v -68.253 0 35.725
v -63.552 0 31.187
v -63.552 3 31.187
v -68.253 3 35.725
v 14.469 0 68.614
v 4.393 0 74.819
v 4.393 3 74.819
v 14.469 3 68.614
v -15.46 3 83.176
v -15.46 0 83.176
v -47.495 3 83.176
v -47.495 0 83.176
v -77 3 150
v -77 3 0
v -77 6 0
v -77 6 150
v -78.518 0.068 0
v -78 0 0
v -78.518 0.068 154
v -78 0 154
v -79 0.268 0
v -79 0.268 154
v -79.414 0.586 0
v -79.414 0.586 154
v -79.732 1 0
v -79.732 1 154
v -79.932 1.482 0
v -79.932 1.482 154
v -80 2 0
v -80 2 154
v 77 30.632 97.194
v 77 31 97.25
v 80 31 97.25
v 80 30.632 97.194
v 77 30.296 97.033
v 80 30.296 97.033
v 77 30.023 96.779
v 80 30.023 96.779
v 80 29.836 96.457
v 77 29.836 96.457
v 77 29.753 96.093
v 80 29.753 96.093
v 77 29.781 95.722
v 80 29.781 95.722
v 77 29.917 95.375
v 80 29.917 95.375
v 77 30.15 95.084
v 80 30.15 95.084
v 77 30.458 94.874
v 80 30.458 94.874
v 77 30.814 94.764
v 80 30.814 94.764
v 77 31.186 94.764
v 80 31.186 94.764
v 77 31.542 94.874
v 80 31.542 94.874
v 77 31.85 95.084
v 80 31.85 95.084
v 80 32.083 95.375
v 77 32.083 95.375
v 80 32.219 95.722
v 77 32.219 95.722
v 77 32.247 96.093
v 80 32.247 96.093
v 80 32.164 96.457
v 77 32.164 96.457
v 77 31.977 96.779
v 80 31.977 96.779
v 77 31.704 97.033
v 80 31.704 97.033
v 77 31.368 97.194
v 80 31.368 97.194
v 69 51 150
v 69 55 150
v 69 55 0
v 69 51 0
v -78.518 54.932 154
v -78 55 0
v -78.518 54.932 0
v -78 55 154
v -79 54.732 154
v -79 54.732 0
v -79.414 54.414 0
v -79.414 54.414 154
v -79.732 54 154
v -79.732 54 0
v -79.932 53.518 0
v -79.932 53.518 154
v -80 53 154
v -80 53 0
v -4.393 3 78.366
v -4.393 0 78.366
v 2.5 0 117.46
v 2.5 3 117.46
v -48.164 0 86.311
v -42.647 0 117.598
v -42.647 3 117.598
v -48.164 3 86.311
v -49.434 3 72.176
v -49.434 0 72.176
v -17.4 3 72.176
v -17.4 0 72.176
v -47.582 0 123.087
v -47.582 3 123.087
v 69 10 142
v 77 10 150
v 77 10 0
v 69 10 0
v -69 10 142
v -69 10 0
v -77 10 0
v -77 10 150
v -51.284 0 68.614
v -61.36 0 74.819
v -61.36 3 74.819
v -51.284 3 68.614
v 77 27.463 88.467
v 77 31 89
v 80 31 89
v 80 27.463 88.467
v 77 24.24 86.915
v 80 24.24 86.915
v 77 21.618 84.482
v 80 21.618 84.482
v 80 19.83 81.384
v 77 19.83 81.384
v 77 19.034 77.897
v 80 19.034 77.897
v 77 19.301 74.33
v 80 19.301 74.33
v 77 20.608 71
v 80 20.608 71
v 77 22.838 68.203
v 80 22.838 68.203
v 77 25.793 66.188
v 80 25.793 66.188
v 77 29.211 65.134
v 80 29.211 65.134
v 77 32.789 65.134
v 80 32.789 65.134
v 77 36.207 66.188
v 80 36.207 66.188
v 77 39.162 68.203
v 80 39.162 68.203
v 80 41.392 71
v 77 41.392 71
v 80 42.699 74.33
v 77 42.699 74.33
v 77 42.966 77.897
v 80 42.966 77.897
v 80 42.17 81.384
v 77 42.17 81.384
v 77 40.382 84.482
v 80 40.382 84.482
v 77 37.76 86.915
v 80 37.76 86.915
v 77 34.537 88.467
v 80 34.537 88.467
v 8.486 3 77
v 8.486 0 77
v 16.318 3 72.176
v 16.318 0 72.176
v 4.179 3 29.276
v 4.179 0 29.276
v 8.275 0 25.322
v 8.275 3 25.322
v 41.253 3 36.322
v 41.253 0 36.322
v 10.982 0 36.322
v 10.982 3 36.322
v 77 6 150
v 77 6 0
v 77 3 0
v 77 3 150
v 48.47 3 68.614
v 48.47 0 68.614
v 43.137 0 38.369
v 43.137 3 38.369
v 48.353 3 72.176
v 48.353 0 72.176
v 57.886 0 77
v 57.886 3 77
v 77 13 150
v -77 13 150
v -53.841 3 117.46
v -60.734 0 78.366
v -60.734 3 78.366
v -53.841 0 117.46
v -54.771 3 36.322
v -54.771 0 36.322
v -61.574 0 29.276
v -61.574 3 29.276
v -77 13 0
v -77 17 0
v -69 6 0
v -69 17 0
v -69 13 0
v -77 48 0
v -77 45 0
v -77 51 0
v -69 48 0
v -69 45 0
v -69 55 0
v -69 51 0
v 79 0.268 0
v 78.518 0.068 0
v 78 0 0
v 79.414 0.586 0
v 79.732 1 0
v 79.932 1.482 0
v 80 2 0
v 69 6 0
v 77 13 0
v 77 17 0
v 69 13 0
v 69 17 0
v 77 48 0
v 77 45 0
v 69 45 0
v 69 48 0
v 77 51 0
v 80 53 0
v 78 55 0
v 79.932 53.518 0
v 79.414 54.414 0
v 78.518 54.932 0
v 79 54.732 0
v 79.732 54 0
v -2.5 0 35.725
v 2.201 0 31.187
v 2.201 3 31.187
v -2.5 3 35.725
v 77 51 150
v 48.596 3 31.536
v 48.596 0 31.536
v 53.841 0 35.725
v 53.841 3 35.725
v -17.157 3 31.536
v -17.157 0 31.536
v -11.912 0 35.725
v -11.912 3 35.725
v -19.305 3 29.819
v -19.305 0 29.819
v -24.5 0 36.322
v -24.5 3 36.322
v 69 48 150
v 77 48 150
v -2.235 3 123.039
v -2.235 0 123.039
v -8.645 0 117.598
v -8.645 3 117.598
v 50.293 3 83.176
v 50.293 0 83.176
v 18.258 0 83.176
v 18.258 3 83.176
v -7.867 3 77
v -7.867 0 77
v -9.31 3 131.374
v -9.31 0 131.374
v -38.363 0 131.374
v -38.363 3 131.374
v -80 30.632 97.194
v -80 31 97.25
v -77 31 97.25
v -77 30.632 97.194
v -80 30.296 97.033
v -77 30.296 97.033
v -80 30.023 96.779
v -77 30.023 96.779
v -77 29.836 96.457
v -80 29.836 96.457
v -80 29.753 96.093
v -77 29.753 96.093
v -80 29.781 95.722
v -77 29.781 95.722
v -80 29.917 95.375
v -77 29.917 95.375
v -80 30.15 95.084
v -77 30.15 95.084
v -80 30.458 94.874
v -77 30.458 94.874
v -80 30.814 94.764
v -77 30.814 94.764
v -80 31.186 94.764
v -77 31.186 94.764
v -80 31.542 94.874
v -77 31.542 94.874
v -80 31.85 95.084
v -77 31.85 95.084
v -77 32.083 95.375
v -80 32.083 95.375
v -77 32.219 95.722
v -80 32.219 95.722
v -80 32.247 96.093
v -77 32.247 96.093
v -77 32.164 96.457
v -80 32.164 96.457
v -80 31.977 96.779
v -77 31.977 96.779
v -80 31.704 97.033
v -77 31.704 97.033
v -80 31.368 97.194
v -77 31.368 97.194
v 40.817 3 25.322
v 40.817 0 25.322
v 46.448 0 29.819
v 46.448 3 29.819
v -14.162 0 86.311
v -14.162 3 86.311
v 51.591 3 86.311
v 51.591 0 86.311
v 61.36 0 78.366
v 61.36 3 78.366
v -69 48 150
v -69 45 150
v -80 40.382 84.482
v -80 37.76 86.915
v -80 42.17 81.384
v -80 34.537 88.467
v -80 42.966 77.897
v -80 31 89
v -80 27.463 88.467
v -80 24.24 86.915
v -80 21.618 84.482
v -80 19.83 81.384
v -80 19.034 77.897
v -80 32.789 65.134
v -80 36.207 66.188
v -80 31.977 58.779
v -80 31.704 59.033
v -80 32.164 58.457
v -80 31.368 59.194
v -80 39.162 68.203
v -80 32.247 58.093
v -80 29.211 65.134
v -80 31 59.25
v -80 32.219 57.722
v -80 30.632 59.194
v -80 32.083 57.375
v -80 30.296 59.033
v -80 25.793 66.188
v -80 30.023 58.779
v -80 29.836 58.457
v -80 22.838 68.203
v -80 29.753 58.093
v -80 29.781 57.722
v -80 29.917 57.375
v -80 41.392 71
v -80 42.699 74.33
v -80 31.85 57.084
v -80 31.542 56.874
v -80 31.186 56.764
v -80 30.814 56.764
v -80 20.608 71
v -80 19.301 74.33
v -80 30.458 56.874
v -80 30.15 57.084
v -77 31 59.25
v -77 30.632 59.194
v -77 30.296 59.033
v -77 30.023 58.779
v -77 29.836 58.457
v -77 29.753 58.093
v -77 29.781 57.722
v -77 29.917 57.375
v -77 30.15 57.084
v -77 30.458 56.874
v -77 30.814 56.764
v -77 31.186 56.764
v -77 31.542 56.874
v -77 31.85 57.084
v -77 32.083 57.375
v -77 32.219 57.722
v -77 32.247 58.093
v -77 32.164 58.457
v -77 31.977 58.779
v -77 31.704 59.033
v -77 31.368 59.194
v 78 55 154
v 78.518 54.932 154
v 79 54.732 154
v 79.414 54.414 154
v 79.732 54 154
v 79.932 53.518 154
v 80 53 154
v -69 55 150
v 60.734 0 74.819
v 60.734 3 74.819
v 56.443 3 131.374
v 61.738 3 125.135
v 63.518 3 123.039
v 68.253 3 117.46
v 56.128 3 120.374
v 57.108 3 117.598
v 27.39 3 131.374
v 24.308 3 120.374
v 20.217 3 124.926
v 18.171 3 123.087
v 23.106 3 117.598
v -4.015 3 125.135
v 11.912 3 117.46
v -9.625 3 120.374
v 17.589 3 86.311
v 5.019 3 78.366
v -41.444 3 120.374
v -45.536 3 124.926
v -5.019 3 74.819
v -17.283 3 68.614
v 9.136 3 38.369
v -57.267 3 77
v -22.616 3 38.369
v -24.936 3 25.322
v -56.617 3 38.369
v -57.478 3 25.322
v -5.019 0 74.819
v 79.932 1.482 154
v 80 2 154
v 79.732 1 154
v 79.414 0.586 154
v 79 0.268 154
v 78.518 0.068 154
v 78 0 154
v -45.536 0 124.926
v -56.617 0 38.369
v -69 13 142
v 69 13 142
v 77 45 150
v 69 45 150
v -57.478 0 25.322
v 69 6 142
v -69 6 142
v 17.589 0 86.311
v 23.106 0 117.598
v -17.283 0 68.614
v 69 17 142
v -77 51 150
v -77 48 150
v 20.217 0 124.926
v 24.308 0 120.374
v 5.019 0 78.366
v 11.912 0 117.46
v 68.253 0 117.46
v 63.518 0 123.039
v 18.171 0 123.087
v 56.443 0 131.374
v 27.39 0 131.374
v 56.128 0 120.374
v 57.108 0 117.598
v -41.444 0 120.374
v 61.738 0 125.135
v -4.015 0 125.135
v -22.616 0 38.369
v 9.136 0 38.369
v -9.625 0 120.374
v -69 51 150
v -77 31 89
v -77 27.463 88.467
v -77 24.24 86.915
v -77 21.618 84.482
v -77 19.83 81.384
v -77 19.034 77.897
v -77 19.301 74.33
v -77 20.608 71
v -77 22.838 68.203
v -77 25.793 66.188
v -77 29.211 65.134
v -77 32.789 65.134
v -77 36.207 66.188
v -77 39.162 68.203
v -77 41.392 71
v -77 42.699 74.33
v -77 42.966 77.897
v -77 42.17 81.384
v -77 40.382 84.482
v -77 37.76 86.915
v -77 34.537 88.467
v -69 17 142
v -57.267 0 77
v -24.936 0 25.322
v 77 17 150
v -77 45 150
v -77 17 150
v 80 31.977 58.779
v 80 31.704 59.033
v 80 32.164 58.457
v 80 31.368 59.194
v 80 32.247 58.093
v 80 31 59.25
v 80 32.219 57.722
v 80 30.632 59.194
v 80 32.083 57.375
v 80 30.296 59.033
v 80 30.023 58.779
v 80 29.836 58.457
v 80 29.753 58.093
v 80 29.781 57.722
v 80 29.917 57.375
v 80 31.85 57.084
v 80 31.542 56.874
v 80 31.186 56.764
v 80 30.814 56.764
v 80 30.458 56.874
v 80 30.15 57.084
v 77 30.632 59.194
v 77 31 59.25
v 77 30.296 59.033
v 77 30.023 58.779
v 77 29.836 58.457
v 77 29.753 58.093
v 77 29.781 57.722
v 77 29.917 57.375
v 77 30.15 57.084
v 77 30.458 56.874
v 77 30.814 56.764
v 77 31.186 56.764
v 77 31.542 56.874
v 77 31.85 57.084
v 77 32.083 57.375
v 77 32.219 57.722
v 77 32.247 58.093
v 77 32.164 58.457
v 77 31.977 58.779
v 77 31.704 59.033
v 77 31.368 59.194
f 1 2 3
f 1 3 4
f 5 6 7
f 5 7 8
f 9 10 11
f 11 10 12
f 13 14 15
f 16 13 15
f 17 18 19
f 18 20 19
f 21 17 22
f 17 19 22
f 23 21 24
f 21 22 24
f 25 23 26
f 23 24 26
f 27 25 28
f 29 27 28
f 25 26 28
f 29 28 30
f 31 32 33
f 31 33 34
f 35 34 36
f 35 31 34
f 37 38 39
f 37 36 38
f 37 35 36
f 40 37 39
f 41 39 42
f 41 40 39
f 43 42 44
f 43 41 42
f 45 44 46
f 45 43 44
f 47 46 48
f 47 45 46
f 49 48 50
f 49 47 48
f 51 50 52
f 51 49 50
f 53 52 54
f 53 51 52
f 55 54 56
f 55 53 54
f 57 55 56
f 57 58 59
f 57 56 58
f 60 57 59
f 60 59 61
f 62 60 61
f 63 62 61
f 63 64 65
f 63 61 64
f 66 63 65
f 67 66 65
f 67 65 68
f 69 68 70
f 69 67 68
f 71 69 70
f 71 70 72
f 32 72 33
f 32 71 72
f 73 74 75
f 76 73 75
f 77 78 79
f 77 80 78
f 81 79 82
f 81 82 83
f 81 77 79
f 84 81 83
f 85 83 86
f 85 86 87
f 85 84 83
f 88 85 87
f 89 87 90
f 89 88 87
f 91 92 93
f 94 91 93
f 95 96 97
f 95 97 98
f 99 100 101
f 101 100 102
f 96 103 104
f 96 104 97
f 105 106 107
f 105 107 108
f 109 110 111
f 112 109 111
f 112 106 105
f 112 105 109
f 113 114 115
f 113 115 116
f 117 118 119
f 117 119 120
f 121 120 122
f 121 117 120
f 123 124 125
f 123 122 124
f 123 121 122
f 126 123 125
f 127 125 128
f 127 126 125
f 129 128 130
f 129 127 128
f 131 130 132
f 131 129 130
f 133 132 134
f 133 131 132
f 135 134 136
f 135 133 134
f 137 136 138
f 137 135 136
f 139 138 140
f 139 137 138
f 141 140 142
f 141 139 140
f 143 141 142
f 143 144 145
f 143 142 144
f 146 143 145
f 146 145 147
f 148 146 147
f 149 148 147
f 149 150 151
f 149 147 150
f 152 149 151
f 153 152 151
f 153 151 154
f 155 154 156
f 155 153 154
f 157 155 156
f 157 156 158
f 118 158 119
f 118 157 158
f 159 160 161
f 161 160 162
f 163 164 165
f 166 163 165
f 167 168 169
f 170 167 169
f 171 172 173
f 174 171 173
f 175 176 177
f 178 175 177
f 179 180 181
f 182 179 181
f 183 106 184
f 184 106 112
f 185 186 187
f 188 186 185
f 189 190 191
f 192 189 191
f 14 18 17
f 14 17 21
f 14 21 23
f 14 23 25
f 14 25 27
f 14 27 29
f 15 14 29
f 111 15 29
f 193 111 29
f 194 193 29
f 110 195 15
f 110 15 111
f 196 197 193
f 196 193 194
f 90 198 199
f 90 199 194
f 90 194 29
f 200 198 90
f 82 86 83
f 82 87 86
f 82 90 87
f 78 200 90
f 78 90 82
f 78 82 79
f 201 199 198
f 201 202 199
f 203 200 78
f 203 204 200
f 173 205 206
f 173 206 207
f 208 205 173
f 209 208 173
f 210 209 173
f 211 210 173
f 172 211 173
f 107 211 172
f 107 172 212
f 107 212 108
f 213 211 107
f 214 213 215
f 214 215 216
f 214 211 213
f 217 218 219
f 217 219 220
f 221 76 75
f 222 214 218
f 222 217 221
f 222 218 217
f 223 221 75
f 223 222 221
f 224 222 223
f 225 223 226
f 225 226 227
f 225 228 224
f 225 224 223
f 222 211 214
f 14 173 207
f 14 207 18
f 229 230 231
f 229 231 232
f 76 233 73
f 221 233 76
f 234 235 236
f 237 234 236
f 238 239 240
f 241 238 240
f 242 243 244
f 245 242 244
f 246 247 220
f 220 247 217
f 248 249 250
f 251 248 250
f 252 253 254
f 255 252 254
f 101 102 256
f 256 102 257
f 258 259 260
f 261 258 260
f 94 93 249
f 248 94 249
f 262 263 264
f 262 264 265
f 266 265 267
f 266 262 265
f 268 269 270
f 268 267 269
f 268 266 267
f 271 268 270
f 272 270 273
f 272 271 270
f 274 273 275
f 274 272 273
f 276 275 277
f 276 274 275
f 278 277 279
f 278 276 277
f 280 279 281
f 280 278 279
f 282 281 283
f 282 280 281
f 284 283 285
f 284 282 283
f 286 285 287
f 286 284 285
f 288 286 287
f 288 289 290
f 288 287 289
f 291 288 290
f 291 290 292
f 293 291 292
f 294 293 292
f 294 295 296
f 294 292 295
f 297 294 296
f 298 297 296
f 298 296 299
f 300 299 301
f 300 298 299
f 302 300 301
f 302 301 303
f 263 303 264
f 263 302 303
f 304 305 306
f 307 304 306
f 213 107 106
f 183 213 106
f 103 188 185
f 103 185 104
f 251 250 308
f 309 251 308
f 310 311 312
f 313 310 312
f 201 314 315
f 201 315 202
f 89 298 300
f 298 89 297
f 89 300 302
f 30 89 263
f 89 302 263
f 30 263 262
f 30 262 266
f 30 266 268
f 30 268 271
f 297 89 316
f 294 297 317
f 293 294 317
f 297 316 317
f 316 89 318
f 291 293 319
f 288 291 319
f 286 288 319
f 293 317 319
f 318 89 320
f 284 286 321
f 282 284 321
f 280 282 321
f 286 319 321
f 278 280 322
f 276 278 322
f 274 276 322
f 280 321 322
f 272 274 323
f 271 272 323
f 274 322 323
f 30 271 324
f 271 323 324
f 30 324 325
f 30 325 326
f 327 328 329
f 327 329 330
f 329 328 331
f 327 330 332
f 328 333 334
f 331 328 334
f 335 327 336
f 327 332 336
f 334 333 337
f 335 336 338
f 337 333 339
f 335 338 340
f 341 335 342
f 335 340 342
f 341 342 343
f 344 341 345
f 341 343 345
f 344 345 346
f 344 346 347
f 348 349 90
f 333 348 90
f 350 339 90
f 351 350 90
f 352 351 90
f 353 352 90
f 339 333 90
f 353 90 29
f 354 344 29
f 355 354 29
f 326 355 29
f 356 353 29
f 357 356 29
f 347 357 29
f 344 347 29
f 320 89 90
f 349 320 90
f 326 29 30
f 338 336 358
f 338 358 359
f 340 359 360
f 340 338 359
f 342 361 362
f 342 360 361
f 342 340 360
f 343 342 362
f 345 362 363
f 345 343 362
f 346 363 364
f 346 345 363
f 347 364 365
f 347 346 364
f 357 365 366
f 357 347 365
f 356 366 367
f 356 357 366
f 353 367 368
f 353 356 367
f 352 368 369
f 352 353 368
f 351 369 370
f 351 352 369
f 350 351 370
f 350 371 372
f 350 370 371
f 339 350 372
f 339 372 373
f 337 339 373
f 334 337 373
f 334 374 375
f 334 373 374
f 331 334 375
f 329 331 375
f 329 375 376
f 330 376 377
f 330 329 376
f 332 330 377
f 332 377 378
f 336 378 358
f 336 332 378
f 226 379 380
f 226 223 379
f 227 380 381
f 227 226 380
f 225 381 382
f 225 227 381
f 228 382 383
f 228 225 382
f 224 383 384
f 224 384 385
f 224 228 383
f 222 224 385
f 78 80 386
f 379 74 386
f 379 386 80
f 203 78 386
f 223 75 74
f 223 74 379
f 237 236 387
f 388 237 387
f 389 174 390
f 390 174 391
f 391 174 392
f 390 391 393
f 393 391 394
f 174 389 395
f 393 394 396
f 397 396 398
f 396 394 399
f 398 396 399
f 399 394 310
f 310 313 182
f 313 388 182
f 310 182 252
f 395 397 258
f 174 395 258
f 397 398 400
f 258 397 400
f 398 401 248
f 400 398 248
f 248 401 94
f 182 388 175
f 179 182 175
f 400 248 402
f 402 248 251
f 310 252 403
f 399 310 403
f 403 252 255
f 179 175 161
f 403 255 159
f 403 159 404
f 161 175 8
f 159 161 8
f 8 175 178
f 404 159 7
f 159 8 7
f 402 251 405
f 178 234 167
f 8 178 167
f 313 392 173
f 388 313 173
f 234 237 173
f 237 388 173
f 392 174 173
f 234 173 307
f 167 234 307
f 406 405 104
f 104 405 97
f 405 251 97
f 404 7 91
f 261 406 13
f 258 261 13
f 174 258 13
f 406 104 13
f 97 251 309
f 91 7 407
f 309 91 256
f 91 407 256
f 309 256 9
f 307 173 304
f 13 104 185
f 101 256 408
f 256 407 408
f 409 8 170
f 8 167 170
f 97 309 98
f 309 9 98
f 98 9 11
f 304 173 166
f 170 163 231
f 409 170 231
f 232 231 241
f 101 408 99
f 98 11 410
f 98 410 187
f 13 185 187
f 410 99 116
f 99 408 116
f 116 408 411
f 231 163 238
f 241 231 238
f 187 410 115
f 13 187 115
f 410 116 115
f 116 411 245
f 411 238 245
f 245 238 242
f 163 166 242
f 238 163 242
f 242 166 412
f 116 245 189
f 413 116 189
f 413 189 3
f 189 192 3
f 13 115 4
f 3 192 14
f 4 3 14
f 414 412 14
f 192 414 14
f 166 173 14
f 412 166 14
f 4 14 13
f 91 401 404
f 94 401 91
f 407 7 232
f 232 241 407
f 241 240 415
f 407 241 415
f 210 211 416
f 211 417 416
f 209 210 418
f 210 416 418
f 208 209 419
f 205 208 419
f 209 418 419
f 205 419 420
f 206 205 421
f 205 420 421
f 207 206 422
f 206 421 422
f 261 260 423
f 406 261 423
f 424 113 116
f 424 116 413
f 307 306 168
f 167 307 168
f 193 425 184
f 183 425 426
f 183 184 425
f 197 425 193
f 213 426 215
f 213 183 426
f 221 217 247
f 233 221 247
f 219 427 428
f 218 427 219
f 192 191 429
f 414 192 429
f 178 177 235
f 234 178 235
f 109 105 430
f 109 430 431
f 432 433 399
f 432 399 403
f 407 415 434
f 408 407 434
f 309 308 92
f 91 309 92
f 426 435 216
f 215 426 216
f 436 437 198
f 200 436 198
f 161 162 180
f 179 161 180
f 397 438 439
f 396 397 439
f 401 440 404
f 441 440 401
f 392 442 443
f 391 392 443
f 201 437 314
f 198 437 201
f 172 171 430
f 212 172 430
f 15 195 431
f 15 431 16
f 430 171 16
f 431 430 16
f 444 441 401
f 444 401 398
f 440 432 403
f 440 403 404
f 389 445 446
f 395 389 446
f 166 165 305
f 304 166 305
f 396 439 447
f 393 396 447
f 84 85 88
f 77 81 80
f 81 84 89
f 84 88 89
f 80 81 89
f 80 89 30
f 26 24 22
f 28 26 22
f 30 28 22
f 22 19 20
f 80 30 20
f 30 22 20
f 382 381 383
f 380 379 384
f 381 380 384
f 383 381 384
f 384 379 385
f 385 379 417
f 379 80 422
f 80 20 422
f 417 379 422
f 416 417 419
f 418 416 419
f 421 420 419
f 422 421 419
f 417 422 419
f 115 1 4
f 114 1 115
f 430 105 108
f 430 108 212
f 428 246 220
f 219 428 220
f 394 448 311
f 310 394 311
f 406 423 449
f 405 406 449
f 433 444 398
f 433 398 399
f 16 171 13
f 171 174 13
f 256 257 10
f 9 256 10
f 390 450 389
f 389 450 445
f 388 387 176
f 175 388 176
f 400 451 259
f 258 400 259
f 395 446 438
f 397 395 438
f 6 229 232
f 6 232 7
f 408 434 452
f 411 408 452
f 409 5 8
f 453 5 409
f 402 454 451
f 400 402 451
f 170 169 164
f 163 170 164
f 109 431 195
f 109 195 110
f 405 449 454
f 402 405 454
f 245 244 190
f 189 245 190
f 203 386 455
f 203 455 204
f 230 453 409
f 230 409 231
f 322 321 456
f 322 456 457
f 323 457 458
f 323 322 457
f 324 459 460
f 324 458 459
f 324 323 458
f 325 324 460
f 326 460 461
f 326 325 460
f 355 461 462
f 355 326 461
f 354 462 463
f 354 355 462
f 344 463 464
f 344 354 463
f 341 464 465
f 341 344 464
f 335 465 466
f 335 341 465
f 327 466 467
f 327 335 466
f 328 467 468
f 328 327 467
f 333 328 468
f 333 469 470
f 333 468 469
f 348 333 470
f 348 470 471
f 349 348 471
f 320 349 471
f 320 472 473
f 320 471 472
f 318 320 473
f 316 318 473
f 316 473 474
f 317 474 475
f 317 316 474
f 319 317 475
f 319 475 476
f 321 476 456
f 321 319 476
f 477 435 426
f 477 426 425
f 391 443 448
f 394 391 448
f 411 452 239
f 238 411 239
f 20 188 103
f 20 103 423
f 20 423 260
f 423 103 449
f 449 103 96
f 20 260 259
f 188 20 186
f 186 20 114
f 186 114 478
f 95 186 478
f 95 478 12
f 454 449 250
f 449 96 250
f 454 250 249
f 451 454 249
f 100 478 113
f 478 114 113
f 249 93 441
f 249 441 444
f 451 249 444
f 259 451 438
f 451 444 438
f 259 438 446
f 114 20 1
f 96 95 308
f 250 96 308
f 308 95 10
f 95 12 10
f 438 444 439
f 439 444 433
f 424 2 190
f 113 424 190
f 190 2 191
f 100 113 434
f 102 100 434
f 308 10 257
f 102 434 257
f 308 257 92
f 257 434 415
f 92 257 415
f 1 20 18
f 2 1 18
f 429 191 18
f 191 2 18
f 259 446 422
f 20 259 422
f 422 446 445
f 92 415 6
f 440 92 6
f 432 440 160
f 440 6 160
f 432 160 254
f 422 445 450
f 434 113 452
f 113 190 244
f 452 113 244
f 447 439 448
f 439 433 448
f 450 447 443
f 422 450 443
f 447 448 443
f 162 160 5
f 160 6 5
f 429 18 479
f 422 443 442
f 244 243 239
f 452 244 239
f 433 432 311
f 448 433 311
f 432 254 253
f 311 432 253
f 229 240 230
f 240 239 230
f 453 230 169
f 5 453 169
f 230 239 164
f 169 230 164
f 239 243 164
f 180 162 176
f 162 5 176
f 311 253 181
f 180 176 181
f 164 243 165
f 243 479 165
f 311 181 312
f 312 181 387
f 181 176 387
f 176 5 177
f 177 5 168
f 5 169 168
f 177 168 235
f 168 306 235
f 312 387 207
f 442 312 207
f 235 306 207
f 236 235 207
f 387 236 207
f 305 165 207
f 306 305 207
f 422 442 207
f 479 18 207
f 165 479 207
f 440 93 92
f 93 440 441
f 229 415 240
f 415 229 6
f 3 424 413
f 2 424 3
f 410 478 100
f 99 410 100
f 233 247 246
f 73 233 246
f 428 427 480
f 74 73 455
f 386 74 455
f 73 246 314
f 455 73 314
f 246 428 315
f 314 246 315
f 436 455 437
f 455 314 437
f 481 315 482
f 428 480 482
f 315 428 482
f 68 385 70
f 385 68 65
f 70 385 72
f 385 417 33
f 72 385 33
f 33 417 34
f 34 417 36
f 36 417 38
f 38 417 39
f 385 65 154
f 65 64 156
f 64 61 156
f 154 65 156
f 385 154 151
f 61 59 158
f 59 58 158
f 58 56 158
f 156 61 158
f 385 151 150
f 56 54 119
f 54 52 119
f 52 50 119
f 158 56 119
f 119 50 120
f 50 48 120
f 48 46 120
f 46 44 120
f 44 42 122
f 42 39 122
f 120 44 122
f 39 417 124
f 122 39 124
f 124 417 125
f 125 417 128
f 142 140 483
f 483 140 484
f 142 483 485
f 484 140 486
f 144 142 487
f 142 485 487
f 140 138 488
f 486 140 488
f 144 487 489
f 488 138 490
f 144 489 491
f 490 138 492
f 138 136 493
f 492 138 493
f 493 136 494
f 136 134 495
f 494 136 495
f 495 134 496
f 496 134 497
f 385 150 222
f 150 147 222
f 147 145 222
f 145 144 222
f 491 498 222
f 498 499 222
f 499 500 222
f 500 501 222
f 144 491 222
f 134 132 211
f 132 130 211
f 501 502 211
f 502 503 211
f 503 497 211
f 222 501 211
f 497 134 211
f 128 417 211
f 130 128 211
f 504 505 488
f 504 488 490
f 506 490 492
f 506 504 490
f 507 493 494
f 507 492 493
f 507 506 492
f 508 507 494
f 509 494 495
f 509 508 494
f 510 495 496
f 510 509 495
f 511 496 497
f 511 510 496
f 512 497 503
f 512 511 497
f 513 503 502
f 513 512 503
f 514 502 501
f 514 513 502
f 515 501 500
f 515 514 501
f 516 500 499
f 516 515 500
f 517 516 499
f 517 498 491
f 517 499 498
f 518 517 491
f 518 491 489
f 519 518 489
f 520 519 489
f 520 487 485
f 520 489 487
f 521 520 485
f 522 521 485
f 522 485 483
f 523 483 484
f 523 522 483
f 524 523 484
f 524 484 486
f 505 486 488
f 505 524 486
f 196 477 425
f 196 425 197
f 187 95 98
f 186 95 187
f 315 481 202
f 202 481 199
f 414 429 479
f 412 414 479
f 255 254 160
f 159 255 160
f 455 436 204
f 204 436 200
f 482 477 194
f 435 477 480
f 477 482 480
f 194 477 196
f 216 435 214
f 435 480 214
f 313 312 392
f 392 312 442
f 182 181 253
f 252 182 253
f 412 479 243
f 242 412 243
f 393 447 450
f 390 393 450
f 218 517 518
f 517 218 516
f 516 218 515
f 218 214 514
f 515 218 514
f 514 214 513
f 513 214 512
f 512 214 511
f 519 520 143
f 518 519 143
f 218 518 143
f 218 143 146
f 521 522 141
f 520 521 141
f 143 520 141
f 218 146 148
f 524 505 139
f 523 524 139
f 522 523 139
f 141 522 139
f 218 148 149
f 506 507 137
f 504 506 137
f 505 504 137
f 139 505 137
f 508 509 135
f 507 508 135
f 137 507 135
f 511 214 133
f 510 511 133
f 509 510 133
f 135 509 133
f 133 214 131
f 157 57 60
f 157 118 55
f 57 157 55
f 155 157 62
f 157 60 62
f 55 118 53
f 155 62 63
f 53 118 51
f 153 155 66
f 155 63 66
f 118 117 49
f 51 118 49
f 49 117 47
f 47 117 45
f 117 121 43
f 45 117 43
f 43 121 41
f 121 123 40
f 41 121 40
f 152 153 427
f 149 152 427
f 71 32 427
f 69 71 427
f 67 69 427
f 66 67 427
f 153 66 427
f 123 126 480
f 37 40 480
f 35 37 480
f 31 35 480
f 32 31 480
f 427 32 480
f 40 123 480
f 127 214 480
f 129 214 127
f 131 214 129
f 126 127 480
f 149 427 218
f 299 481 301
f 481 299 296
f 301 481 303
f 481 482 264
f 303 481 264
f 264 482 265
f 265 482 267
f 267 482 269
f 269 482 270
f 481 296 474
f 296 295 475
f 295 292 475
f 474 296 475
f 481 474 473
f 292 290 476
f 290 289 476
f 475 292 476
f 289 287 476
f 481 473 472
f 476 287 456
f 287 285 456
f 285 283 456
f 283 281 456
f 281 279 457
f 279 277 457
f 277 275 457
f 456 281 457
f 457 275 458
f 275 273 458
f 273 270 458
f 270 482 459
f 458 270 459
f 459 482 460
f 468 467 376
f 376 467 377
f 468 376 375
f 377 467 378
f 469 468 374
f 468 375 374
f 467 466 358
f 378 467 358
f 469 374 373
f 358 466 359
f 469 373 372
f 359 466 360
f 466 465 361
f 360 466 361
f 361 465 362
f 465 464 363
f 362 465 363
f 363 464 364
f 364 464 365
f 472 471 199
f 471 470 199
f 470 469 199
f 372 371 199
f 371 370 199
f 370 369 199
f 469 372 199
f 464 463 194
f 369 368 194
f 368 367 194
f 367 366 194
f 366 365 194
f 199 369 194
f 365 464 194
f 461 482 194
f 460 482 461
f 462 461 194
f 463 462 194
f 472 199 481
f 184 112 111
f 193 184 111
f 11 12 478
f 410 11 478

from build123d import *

# Parameters (mm, degrees)
BOSS_EXTRUDE4_DEPTH             = 154
BOSS_EXTRUDE5_REACH             = 216.516
SKETCH11_W                      = 4
SKETCH11_H                      = 7
BOSS_EXTRUDE5_DIRECTION_2_REACH = 216.516
BOSS_EXTRUDE6_DEPTH             = 45
SKETCH15_W                      = 138
SKETCH15_H                      = 4
SKETCH15_W_2                    = 154
BOSS_EXTRUDE7_DEPTH             = 8
SKETCH16_W                      = 150
SKETCH16_H                      = 3
SKETCH16_W_2                    = 142
SKETCH16_H_2                    = 4
BOSS_EXTRUDE8_DEPTH             = 8
CUT_EXTRUDE2_DEPTH              = 229.781555201
CUT_EXTRUDE2_DEPTH_BACK         = 229.781555201
SKETCH19_R                      = 12
SKETCH19_R_2                    = 1.25
CUT_EXTRUDE3_REACH              = 184.047
FILLET3_R                       = 2


with BuildPart() as part:
    # Sketch3 → Boss-Extrude4 (new body)
    with BuildSketch(Plane.XY):
        Polygon((-80, 0), (80, 0), (80, 10), (69, 10), (69, 6), (77, 6), (77, 3), (-77, 3), (-77, 6), (-69, 6), (-69, 10), (-80, 10), align=None)
    extrude(amount=BOSS_EXTRUDE4_DEPTH)

    # Sketch11 → Boss-Extrude5 (add, up to next)
    with BuildSketch(Plane(origin=(-69, 0, 0), x_dir=(0, 0, -1), z_dir=(1, 0, 0)), mode=Mode.PRIVATE) as boss_extrude5_sk1:
        with Locations((-152, 6.5)):
            Rectangle(SKETCH11_W, SKETCH11_H)
    boss_extrude5_tool1 = extrude(boss_extrude5_sk1.sketch, amount=BOSS_EXTRUDE5_REACH, mode=Mode.PRIVATE) - part.part
    add(boss_extrude5_tool1.solids().sort_by_distance((-69, 6.5, 152))[0])

    # Sketch11 → Boss-Extrude5 direction 2 (add, up to next)
    with BuildSketch(Plane(origin=(-69, 0, 0), x_dir=(0, 0, -1), z_dir=(1, 0, 0)), mode=Mode.PRIVATE) as boss_extrude5_direction_2_sk1:
        with Locations((-152, 6.5)):
            Rectangle(SKETCH11_W, SKETCH11_H)
    boss_extrude5_direction_2_tool1 = extrude(boss_extrude5_direction_2_sk1.sketch, amount=-BOSS_EXTRUDE5_DIRECTION_2_REACH, mode=Mode.PRIVATE) - part.part
    add(boss_extrude5_direction_2_tool1.solids().sort_by_distance((-69, 6.5, 152))[0])

    # Sketch13 → Boss-Extrude6 (add)
    with BuildSketch(Plane(origin=(0, 10, 0), x_dir=(1, 0, 0), z_dir=(0, 1, 0))):
        Polygon((80, 0), (77, 0), (77, -150), (-77, -150), (-77, 0), (-80, 0), (-80, -154), (80, -154), align=None)
    extrude(amount=BOSS_EXTRUDE6_DEPTH)

    # Sketch15 → Boss-Extrude7 (add)
    with BuildSketch(Plane(origin=(0, 0, 150), x_dir=(-1, 0, 0), z_dir=(0, 0, -1))):
        with Locations((0, 8)):
            Rectangle(SKETCH15_W, SKETCH15_H)
        with Locations((0, 15)):
            Rectangle(SKETCH15_W_2, SKETCH15_H)
    extrude(amount=BOSS_EXTRUDE7_DEPTH)

    # Sketch16 → Boss-Extrude8 (add)
    with BuildSketch(Plane(origin=(-77, 0, 0), x_dir=(0, 0, -1), z_dir=(1, 0, 0))):
        with Locations((-75, 46.5)):
            Rectangle(SKETCH16_W, SKETCH16_H)
        with Locations((-71, 15)):
            Rectangle(SKETCH16_W_2, SKETCH16_H_2)
        with Locations((-75, 53)):
            Rectangle(SKETCH16_W, SKETCH16_H_2)
    boss_extrude8 = extrude(amount=BOSS_EXTRUDE8_DEPTH)

    # Mirror1: Boss-Extrude8 across plane
    add(boss_extrude8.mirror(Plane(origin=(0, 0, 0), x_dir=(0, 0, 1), z_dir=(1, 0, 0))))

    # Sketch19 → Cut-Extrude2 (cut, two sides: drawn at the far end of the back side and taken through both)
    with BuildSketch(Plane(origin=(80, 0, 0), x_dir=(0, 0, -1), z_dir=(1, 0, 0)).offset(-CUT_EXTRUDE2_DEPTH_BACK)):
        with Locations(Location((-77, 31, 0), (0, 0, 180))):
            Circle(SKETCH19_R)
        with Locations(Location((-58, 31, 0), (0, 0, 180))):
            Circle(SKETCH19_R_2)
        with Locations(Location((-96, 31, 0), (0, 0, 180))):
            Circle(SKETCH19_R_2)
    extrude(amount=CUT_EXTRUDE2_DEPTH + CUT_EXTRUDE2_DEPTH_BACK, mode=Mode.SUBTRACT)

    # Sketch27 → Cut-Extrude3 (cut, up to next)
    with BuildSketch(Plane.XZ, mode=Mode.PRIVATE) as cut_extrude3_sk1:
        Polygon((-57.47846256, 25.321688373), (-24.93570827, 25.321688373), (-19.305381247, 29.819289123), (-24.499608086, 36.321688373), (-54.771412112, 36.321688373), (-61.574151377, 29.276341528), align=None)
    cut_extrude3_tool1 = extrude(cut_extrude3_sk1.sketch, amount=-CUT_EXTRUDE3_REACH, mode=Mode.PRIVATE) & part.part
    # Sketch27 → Cut-Extrude3 (cut, up to next)
    with BuildSketch(Plane.XZ, mode=Mode.PRIVATE) as cut_extrude3_sk2:
        Polygon((-56.617071459, 38.369250276), (-63.55245833, 31.186525183), (-68.252983819, 35.725187368), (-61.359608852, 74.819459497), (-51.28413594, 68.613830533), align=None)
    cut_extrude3_tool2 = extrude(cut_extrude3_sk2.sketch, amount=-CUT_EXTRUDE3_REACH, mode=Mode.PRIVATE) & part.part
    # Sketch27 → Cut-Extrude3 (cut, up to next)
    with BuildSketch(Plane.XZ, mode=Mode.PRIVATE) as cut_extrude3_sk3:
        Polygon((-22.615548373, 38.369250276), (-17.156752628, 31.535650116), (-11.912075272, 35.725187368), (-5.018700304, 74.819459497), (-17.282612854, 68.613830533), align=None)
    cut_extrude3_tool3 = extrude(cut_extrude3_sk3.sketch, amount=-CUT_EXTRUDE3_REACH, mode=Mode.PRIVATE) & part.part
    # Sketch27 → Cut-Extrude3 (cut, up to next)
    with BuildSketch(Plane.XZ, mode=Mode.PRIVATE) as cut_extrude3_sk4:
        Polygon((-57.266645874, 77), (-49.434486563, 72.176060211), (-17.400076182, 72.176060211), (-7.866735395, 77), (-15.460479394, 83.176060211), (-47.494889775, 83.176060211), align=None)
    cut_extrude3_tool4 = extrude(cut_extrude3_sk4.sketch, amount=-CUT_EXTRUDE3_REACH, mode=Mode.PRIVATE) & part.part
    # Sketch27 → Cut-Extrude3 (cut, up to next)
    with BuildSketch(Plane.XZ, mode=Mode.PRIVATE) as cut_extrude3_sk5:
        Polygon((-60.734283515, 78.365855711), (-53.840908548, 117.46012784), (-47.581510302, 123.087083774), (-42.646926869, 117.59787731), (-48.163667933, 86.310884009), align=None)
    cut_extrude3_tool5 = extrude(cut_extrude3_sk5.sketch, amount=-CUT_EXTRUDE3_REACH, mode=Mode.PRIVATE) & part.part
    # Sketch27 → Cut-Extrude3 (cut, up to next)
    with BuildSketch(Plane.XZ, mode=Mode.PRIVATE) as cut_extrude3_sk6:
        Polygon((-14.162144847, 86.310884009), (-4.393374967, 78.365855711), (2.5, 117.46012784), (-2.235185266, 123.038840685), (-8.645403783, 117.59787731), align=None)
    cut_extrude3_tool6 = extrude(cut_extrude3_sk6.sketch, amount=-CUT_EXTRUDE3_REACH, mode=Mode.PRIVATE) & part.part
    # Sketch27 → Cut-Extrude3 (cut, up to next)
    with BuildSketch(Plane.XZ, mode=Mode.PRIVATE) as cut_extrude3_sk7:
        Polygon((-45.536395336, 124.925562704), (-41.444496972, 120.373754987), (-9.624660978, 120.373754987), (-4.014751663, 125.13541967), (-9.309821385, 131.373754987), (-38.363457794, 131.373754987), align=None)
    cut_extrude3_tool7 = extrude(cut_extrude3_sk7.sketch, amount=-CUT_EXTRUDE3_REACH, mode=Mode.PRIVATE) & part.part
    # Sketch27 → Cut-Extrude3 (cut, up to next)
    with BuildSketch(Plane.XZ, mode=Mode.PRIVATE) as cut_extrude3_sk8:
        Polygon((8.274521259, 25.321688373), (40.817275549, 25.321688373), (46.447602573, 29.819289123), (41.253375733, 36.321688373), (10.981571707, 36.321688373), (4.178832443, 29.276341528), align=None)
    cut_extrude3_tool8 = extrude(cut_extrude3_sk8.sketch, amount=-CUT_EXTRUDE3_REACH, mode=Mode.PRIVATE) & part.part
    # Sketch27 → Cut-Extrude3 (cut, up to next)
    with BuildSketch(Plane.XZ, mode=Mode.PRIVATE) as cut_extrude3_sk9:
        Polygon((9.13591236, 38.369250276), (2.200525489, 31.186525183), (-2.5, 35.725187368), (4.393374967, 74.819459497), (14.46884788, 68.613830533), align=None)
    cut_extrude3_tool9 = extrude(cut_extrude3_sk9.sketch, amount=-CUT_EXTRUDE3_REACH, mode=Mode.PRIVATE) & part.part
    # Sketch27 → Cut-Extrude3 (cut, up to next)
    with BuildSketch(Plane.XZ, mode=Mode.PRIVATE) as cut_extrude3_sk10:
        Polygon((43.137435446, 38.369250276), (48.596231191, 31.535650116), (53.840908548, 35.725187368), (60.734283515, 74.819459497), (48.470370966, 68.613830533), align=None)
    cut_extrude3_tool10 = extrude(cut_extrude3_sk10.sketch, amount=-CUT_EXTRUDE3_REACH, mode=Mode.PRIVATE) & part.part
    # Sketch27 → Cut-Extrude3 (cut, up to next)
    with BuildSketch(Plane.XZ, mode=Mode.PRIVATE) as cut_extrude3_sk11:
        Polygon((8.486337945, 77), (16.318497257, 72.176060211), (48.352907637, 72.176060211), (57.886248425, 77), (50.292504425, 83.176060211), (18.258094045, 83.176060211), align=None)
    cut_extrude3_tool11 = extrude(cut_extrude3_sk11.sketch, amount=-CUT_EXTRUDE3_REACH, mode=Mode.PRIVATE) & part.part
    # Sketch27 → Cut-Extrude3 (cut, up to next)
    with BuildSketch(Plane.XZ, mode=Mode.PRIVATE) as cut_extrude3_sk12:
        Polygon((5.018700304, 78.365855711), (11.912075272, 117.46012784), (18.171473518, 123.087083774), (23.106056951, 117.59787731), (17.589315886, 86.310884009), align=None)
    cut_extrude3_tool12 = extrude(cut_extrude3_sk12.sketch, amount=-CUT_EXTRUDE3_REACH, mode=Mode.PRIVATE) & part.part
    # Sketch27 → Cut-Extrude3 (cut, up to next)
    with BuildSketch(Plane.XZ, mode=Mode.PRIVATE) as cut_extrude3_sk13:
        Polygon((51.590838973, 86.310884009), (61.359608852, 78.365855711), (68.252983819, 117.46012784), (63.517798554, 123.038840685), (57.107580037, 117.59787731), align=None)
    cut_extrude3_tool13 = extrude(cut_extrude3_sk13.sketch, amount=-CUT_EXTRUDE3_REACH, mode=Mode.PRIVATE) & part.part
    # Sketch27 → Cut-Extrude3 (cut, up to next)
    with BuildSketch(Plane.XZ, mode=Mode.PRIVATE) as cut_extrude3_sk14:
        Polygon((20.216588483, 124.925562704), (24.308486848, 120.373754987), (56.128322842, 120.373754987), (61.738232157, 125.13541967), (56.443162434, 131.373754987), (27.389526025, 131.373754987), align=None)
    cut_extrude3_tool14 = extrude(cut_extrude3_sk14.sketch, amount=-CUT_EXTRUDE3_REACH, mode=Mode.PRIVATE) & part.part
    add(cut_extrude3_tool1.solids().sort_by_distance((-40.338799, 0, 30.704471))[0], mode=Mode.SUBTRACT)
    add(cut_extrude3_tool2.solids().sort_by_distance((-59.857835, 0, 52.918339))[0], mode=Mode.SUBTRACT)
    add(cut_extrude3_tool3.solids().sort_by_distance((-14.193031, 0, 53.066237))[0], mode=Mode.SUBTRACT)
    add(cut_extrude3_tool4.solids().sort_by_distance((-32.455956, 0, 77.628005))[0], mode=Mode.SUBTRACT)
    add(cut_extrude3_tool5.solids().sort_by_distance((-51.306641, 0, 101.288791))[0], mode=Mode.SUBTRACT)
    add(cut_extrude3_tool6.solids().sort_by_distance((-5.750482, 0, 101.274794))[0], mode=Mode.SUBTRACT)
    add(cut_extrude3_tool7.solids().sort_by_distance((-24.675646, 0, 125.760601))[0], mode=Mode.SUBTRACT)
    add(cut_extrude3_tool8.solids().sort_by_distance((25.414185, 0, 30.704471))[0], mode=Mode.SUBTRACT)
    add(cut_extrude3_tool9.solids().sort_by_distance((5.895149, 0, 52.918339))[0], mode=Mode.SUBTRACT)
    add(cut_extrude3_tool10.solids().sort_by_distance((51.559953, 0, 53.066237))[0], mode=Mode.SUBTRACT)
    add(cut_extrude3_tool11.solids().sort_by_distance((33.297027, 0, 77.628005))[0], mode=Mode.SUBTRACT)
    add(cut_extrude3_tool12.solids().sort_by_distance((14.446343, 0, 101.288791))[0], mode=Mode.SUBTRACT)
    add(cut_extrude3_tool13.solids().sort_by_distance((60.002501, 0, 101.274794))[0], mode=Mode.SUBTRACT)
    add(cut_extrude3_tool14.solids().sort_by_distance((41.077338, 0, 125.760601))[0], mode=Mode.SUBTRACT)

    # Fillet3
    fillet3_edges = [part.edges().sort_by_distance(p)[0] for p in [
        (-80, 0, 77),
        (80, 0, 77),
        (80, 55, 77),
        (-80, 55, 77),
    ]]
    fillet(fillet3_edges, radius=FILLET3_R)


solid = part.part
